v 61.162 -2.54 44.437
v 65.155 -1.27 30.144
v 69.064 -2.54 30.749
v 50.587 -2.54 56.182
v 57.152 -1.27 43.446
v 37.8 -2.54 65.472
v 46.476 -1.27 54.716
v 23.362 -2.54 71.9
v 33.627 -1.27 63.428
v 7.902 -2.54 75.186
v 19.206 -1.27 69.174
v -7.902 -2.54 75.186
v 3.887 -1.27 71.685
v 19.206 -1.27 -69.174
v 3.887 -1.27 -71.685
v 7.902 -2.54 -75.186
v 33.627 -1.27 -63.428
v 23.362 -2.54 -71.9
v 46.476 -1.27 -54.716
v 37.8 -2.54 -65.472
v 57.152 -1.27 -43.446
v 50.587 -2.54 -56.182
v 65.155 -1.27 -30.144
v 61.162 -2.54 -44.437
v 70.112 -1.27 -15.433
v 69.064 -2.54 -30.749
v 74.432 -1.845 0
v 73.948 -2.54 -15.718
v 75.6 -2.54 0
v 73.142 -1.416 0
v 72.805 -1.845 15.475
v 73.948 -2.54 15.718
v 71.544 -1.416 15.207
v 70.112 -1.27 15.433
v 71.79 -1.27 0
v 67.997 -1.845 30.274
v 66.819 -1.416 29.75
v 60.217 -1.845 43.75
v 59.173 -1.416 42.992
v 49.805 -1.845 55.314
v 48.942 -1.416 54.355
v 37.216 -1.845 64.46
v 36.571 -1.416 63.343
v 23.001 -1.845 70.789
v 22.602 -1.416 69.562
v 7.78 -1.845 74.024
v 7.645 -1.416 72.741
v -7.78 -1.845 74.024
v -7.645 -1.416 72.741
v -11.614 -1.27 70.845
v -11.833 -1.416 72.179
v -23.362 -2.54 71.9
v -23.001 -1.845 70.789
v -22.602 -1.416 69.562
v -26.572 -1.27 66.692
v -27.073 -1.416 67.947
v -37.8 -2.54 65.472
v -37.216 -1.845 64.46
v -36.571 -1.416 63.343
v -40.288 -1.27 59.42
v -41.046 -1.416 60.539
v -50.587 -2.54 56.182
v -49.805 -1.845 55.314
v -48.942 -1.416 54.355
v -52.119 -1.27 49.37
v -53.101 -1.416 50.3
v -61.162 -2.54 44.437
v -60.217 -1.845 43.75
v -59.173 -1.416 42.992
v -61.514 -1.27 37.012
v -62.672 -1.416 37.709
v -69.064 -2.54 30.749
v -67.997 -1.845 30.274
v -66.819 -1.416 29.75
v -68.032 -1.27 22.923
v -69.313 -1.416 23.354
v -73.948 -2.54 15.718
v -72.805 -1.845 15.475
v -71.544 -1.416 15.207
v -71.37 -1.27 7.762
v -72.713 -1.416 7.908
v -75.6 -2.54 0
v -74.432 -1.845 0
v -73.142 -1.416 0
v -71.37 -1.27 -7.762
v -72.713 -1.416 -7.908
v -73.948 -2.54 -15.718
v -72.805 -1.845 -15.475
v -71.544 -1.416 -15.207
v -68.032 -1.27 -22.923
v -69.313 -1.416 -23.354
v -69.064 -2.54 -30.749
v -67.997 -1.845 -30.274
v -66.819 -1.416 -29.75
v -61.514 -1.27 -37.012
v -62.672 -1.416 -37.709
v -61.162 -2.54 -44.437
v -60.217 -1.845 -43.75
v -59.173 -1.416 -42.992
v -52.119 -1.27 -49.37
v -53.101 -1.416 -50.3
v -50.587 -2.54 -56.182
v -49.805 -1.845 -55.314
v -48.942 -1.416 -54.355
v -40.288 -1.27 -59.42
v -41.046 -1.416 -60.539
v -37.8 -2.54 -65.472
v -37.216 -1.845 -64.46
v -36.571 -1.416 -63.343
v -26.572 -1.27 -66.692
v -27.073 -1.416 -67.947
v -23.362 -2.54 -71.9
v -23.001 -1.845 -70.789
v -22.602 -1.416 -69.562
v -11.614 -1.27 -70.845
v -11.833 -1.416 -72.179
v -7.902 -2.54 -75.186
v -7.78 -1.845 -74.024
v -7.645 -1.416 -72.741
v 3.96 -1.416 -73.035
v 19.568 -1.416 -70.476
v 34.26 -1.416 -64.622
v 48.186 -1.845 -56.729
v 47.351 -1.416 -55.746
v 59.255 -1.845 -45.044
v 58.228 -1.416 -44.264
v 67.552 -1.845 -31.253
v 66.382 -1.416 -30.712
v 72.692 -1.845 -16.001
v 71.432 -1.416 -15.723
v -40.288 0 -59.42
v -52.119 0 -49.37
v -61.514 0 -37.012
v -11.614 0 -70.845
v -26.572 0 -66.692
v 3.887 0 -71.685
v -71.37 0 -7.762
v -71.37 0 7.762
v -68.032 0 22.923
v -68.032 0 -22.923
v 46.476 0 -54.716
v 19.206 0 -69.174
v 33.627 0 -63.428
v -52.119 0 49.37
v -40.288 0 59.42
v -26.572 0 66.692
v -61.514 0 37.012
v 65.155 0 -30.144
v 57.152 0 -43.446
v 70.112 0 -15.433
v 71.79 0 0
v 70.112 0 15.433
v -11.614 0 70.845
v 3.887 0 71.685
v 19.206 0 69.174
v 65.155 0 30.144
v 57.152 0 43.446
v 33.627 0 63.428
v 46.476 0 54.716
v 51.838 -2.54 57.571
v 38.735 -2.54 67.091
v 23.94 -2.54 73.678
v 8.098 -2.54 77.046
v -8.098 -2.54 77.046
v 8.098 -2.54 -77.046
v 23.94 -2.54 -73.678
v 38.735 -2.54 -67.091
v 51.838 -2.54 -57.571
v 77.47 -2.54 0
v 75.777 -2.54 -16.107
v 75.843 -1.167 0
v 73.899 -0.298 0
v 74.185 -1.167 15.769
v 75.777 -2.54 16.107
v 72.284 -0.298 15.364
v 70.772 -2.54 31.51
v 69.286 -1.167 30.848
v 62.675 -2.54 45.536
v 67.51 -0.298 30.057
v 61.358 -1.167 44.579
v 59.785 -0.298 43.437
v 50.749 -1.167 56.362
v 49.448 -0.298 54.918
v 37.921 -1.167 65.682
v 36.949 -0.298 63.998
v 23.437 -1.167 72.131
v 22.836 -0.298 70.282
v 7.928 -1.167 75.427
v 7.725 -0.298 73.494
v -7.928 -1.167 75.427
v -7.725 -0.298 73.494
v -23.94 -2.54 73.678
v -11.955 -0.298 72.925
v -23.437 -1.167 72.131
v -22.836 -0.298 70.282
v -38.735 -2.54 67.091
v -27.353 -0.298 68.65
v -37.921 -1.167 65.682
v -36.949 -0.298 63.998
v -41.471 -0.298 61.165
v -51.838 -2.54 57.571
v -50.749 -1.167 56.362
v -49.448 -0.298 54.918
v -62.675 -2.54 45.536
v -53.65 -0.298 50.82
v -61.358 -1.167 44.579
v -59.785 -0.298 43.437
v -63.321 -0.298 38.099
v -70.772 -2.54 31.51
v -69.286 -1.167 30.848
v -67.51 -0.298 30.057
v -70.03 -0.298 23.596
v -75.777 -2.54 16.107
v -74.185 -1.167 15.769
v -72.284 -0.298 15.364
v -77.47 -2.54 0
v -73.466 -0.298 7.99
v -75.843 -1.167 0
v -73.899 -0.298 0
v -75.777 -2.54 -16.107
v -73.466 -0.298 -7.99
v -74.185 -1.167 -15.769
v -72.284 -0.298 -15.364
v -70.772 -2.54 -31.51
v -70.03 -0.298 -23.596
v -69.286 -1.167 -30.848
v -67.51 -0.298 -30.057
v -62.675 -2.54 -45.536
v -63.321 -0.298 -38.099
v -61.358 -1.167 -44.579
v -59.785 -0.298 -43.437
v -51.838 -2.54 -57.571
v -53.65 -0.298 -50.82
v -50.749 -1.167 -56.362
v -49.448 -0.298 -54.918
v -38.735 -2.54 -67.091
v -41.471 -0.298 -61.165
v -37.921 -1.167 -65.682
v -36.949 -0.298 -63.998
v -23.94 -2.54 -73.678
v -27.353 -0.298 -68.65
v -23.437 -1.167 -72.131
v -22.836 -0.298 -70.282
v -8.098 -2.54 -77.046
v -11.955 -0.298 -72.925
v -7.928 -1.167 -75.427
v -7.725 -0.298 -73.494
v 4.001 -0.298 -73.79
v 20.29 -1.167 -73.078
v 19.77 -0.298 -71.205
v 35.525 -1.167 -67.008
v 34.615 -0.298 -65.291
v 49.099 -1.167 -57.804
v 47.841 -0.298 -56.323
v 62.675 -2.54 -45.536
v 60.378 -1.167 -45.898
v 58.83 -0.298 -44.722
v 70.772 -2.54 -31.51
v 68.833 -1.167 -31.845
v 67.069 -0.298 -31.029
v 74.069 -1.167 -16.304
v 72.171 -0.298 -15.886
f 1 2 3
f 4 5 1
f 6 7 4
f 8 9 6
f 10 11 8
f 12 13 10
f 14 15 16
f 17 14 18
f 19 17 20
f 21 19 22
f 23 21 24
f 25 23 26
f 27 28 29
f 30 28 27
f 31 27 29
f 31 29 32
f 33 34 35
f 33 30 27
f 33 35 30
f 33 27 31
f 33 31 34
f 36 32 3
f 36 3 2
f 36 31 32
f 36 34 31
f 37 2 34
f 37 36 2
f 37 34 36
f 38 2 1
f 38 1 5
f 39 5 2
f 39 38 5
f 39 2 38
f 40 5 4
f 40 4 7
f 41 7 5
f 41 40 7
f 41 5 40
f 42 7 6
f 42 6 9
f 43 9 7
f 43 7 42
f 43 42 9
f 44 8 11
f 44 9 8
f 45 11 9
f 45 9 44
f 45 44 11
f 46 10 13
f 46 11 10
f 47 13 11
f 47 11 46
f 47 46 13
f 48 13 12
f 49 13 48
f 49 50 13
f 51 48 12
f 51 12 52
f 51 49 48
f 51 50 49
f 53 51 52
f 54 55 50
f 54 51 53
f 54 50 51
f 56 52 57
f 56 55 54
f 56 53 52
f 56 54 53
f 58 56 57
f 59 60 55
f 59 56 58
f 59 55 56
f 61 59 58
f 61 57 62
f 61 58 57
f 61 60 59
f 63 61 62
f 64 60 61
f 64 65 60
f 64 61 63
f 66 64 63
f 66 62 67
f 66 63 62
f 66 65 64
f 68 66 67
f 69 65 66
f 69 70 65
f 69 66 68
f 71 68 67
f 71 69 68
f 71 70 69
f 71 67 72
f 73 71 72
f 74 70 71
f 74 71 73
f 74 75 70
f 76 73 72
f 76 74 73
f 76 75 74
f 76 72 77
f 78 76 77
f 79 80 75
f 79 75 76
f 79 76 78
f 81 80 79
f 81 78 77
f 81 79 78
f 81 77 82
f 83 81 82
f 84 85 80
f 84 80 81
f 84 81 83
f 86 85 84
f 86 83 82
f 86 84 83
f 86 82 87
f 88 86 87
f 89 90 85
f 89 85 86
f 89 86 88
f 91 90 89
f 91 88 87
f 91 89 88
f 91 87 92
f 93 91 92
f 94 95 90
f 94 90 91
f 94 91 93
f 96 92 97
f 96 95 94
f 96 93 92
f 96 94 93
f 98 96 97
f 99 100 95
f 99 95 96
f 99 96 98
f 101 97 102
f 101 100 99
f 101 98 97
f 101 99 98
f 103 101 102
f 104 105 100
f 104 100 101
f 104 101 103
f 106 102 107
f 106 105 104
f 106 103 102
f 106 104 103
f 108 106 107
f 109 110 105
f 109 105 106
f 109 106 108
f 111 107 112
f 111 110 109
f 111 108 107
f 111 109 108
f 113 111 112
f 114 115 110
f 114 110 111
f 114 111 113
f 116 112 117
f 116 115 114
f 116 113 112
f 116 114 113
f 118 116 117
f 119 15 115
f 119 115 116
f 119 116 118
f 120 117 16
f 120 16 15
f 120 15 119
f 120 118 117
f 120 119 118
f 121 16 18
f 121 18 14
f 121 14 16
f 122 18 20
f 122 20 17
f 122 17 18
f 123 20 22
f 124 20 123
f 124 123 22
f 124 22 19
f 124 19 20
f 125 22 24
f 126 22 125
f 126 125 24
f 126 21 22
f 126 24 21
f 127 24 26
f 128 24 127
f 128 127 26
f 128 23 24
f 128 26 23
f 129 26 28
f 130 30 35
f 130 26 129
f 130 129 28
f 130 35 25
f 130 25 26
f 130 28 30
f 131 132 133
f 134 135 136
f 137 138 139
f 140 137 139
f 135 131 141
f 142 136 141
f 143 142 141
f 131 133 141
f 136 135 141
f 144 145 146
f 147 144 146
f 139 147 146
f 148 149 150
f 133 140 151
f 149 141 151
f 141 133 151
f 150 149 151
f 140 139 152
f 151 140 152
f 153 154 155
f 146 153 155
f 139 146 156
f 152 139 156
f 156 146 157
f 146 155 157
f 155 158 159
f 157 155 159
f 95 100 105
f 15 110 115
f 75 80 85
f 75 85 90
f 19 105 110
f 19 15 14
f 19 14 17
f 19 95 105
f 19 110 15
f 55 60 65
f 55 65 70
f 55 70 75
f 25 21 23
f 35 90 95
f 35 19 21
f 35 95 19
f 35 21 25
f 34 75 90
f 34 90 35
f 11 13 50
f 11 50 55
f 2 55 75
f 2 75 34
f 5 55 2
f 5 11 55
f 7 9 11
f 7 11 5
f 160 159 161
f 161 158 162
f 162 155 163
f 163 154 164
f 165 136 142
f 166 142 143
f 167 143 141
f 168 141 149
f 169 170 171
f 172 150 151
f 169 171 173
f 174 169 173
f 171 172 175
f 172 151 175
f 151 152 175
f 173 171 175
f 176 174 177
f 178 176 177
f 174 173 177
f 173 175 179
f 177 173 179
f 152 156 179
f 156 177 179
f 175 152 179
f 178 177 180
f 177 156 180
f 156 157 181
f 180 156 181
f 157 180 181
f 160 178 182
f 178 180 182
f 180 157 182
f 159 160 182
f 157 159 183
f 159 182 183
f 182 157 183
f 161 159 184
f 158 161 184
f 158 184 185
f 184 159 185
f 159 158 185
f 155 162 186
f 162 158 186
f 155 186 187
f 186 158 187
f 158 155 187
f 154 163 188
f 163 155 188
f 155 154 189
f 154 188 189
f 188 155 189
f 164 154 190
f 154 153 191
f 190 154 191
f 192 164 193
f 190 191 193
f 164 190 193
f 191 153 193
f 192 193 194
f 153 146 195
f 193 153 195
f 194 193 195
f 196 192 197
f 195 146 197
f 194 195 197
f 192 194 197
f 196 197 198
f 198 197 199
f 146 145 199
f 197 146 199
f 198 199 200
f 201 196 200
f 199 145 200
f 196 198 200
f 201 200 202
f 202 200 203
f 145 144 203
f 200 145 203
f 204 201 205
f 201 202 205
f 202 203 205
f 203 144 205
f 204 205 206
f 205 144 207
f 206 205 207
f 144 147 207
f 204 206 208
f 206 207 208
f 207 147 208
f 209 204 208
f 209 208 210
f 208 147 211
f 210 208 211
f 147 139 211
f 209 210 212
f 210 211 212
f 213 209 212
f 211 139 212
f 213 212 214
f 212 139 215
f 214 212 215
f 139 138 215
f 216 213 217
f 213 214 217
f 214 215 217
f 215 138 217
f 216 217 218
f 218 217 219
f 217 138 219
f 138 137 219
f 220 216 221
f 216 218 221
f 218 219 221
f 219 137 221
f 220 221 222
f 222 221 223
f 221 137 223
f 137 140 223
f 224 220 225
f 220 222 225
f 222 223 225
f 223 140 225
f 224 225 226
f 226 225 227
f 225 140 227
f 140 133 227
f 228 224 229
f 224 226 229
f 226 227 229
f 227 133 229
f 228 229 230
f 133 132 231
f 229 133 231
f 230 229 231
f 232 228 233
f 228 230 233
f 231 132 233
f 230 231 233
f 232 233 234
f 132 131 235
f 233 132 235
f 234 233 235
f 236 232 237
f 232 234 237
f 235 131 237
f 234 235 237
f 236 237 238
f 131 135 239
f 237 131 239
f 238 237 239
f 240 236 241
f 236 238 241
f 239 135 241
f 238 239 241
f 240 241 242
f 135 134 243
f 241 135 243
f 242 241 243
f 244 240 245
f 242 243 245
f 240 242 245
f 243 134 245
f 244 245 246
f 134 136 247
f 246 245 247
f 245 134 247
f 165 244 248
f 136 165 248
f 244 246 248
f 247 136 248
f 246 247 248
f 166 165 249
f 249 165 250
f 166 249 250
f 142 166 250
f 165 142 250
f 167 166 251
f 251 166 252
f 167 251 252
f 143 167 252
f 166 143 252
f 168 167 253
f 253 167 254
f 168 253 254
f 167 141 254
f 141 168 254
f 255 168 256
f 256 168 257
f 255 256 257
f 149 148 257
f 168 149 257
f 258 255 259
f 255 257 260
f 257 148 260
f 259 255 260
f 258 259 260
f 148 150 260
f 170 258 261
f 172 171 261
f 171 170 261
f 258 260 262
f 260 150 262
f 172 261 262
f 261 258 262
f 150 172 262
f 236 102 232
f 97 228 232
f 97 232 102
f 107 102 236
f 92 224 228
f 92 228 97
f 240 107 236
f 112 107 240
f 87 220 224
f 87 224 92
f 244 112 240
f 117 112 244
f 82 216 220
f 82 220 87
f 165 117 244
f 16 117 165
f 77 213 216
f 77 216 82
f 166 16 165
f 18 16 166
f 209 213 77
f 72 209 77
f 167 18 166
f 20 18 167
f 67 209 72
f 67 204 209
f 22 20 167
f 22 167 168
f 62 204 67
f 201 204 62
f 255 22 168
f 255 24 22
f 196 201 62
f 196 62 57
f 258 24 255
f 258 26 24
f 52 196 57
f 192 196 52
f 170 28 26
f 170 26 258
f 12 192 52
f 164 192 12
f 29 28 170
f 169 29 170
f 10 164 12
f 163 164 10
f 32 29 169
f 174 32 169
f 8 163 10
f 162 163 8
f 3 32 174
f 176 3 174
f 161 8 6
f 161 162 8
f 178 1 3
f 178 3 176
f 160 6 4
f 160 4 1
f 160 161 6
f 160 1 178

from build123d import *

# Parameters (mm, degrees)
F0_R     = 77.47
F1_DEPTH = 2.54
F3_T     = -1.27


# Not quite as in the source:
# - a fillet or chamfer that OpenCascade refuses, or shapes differently, is made with other operations: its cross-section is extruded or revolved along the edge and cut away or added
# - a feature names something its author has since deleted; it is built from what else it names


with BuildPart() as f1:
    # F0 (on Front) → F1 (new body)
    with BuildSketch(Plane.XZ):
        Circle(F0_R)
    extrude(amount=F1_DEPTH)

    # F2: fillet of radius 7.62 on 1 edges, made by hand

    # F2_s1 → F2_t2 (revolve, cut)
    with BuildSketch(Plane.XY):
        with BuildLine():
            ThreePointArc((77.47, -2.54), (74.9012393105, -0.6639235197), (71.7903873372, 0))
            Line((71.7903873372, 0), (77.47, 0))
            Line((77.47, 0), (77.47, -2.54))
        make_face()
    revolve(axis=Axis((0, 0, 0), (0, -1, 0)), mode=Mode.SUBTRACT)

    # F3
    f3_openings = [f1.faces().sort_by_distance(p)[0] for p in [
        (0, -2.54, 0),
    ]]
    offset(amount=F3_T, openings=f3_openings)


solid = f1.part
